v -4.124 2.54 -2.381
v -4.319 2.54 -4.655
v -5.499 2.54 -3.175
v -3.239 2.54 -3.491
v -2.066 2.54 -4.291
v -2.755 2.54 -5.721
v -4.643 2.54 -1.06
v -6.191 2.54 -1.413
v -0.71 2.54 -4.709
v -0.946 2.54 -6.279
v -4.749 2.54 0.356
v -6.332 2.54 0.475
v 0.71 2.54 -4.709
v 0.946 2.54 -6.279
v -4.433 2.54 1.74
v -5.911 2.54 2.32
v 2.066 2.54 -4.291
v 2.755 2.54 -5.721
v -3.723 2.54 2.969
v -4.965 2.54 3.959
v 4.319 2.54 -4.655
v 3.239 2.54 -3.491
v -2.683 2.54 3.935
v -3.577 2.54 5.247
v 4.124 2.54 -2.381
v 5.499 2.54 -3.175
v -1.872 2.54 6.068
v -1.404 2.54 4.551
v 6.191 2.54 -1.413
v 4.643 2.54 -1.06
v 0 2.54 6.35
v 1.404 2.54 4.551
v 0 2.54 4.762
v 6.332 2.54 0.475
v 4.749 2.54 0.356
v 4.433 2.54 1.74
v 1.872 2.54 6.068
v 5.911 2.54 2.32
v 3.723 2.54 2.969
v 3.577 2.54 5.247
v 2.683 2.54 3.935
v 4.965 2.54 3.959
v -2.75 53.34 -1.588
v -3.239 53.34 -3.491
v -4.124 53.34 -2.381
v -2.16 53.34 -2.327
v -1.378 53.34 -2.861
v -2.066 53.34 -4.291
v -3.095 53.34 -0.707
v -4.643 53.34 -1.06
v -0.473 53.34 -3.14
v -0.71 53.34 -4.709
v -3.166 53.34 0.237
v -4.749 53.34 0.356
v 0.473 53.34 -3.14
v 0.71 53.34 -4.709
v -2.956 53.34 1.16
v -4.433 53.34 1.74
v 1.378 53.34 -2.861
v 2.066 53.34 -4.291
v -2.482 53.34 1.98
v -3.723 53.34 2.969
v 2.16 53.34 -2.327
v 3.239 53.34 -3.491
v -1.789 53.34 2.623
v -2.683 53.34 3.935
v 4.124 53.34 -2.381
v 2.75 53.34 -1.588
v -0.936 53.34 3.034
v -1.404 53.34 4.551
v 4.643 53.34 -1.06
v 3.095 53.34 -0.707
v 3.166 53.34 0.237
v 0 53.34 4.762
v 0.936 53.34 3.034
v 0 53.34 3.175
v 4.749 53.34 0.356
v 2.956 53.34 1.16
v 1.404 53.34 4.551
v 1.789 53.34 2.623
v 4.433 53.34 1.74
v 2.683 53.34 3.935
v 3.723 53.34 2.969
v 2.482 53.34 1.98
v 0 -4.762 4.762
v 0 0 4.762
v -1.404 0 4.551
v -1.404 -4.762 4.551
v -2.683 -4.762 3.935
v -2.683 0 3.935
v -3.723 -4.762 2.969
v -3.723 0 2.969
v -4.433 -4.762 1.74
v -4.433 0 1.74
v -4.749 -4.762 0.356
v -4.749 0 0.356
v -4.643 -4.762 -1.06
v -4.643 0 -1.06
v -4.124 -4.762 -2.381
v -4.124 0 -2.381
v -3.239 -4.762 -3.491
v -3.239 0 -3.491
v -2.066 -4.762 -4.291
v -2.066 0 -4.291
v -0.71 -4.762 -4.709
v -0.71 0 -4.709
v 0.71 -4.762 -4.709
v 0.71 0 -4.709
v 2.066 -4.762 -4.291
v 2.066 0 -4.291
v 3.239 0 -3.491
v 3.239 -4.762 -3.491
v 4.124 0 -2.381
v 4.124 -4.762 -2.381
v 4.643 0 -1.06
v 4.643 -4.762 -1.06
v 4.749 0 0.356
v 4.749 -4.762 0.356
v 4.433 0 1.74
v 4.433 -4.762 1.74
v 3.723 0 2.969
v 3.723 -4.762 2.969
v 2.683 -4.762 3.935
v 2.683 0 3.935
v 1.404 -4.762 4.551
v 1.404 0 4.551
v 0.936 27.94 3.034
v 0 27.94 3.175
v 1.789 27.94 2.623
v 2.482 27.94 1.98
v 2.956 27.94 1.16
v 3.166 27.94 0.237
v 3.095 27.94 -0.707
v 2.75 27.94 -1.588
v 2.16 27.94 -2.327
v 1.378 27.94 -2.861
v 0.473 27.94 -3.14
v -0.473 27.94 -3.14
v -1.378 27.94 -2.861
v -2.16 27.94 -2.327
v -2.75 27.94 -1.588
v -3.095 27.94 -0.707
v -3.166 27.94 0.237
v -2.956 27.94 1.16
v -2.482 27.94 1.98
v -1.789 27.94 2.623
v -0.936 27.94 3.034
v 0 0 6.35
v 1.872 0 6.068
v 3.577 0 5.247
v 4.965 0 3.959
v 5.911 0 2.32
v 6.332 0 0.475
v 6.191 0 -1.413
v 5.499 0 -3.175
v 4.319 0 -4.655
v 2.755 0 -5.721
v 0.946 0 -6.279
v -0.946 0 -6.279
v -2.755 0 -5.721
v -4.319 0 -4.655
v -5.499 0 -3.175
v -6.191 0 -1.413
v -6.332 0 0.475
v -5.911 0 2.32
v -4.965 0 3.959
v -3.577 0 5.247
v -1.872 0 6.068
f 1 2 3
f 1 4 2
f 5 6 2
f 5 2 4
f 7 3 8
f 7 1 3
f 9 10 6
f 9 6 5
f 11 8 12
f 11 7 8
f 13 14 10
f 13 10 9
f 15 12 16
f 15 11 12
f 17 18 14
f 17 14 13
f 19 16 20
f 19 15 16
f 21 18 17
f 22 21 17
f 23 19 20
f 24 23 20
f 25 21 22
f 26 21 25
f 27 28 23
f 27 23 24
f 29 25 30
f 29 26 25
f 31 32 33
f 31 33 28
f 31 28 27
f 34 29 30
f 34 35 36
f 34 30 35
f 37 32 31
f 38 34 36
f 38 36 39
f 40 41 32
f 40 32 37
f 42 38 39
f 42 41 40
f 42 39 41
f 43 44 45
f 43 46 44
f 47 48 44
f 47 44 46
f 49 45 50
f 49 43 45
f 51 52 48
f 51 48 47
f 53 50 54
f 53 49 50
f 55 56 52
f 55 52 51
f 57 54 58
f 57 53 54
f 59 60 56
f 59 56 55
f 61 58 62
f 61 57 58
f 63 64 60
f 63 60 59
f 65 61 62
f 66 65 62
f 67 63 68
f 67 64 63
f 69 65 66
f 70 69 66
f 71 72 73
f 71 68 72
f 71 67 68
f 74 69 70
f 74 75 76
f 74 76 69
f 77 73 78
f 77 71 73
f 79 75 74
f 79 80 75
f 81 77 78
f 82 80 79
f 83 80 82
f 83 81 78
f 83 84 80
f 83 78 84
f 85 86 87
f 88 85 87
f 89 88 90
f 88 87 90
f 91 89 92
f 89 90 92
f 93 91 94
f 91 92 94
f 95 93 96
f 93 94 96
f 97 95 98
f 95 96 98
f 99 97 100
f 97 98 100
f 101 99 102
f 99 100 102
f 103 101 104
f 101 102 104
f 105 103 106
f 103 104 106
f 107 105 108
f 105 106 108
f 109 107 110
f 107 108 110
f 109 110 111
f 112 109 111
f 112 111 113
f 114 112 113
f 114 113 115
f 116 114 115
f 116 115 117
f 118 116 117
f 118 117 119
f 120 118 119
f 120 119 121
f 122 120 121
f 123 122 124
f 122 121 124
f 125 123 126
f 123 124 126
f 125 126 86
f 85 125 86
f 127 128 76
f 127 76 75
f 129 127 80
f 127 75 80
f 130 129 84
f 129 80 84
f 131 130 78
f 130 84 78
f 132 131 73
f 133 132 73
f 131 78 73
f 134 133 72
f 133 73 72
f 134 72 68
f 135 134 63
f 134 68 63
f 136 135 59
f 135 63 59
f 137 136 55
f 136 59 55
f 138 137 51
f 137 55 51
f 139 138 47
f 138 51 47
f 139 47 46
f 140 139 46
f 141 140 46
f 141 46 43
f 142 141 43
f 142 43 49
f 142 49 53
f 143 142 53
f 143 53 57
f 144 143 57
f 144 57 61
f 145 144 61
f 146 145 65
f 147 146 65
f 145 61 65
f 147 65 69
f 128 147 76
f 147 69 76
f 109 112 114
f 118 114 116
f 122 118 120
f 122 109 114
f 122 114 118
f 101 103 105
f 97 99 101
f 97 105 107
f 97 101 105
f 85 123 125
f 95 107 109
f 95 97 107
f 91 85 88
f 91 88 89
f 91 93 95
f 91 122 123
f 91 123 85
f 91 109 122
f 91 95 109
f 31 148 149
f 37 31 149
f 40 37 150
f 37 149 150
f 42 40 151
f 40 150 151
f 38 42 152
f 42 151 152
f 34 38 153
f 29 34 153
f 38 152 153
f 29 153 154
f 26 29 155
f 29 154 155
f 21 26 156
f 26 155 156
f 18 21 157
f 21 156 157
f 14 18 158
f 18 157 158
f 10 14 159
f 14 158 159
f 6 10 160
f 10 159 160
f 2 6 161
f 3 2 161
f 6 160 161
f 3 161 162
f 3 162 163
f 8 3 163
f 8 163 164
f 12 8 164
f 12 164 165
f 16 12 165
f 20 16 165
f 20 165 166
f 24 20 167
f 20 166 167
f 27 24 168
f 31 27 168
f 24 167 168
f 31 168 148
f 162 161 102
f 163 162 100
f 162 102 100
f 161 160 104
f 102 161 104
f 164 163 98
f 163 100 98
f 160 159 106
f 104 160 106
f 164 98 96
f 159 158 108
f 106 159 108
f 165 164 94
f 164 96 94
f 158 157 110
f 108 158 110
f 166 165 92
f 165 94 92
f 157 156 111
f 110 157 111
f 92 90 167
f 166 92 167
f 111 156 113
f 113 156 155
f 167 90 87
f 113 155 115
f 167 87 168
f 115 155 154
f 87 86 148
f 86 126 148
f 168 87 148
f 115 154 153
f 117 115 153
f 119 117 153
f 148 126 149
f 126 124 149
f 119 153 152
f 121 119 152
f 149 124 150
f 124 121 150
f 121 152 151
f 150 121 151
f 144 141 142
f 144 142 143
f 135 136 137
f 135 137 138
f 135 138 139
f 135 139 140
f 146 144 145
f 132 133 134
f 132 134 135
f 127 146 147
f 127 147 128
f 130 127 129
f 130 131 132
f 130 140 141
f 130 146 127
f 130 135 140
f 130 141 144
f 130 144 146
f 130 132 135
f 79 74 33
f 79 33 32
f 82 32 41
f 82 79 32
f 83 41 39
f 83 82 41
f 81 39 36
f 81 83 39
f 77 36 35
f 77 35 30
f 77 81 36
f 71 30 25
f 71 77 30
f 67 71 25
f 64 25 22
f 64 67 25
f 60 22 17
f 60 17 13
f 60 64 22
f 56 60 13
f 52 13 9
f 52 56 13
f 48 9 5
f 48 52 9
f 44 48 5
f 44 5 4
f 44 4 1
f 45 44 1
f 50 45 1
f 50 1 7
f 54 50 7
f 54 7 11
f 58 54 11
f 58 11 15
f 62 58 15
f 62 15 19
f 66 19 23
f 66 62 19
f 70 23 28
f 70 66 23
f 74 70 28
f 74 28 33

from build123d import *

# Parameters (mm, degrees)
SKETCH1_R           = 6.35
BOSS_EXTRUDE1_DEPTH = 2.54
SKETCH2_R           = 4.7625
BOSS_EXTRUDE2_DEPTH = 4.7625
BOSS_EXTRUDE3_START = 50.8
SKETCH3_R           = 4.7625
BOSS_EXTRUDE3_DEPTH = 50.8
SKETCH4_R           = 3.175
CUT_EXTRUDE1_DEPTH  = 25.4


with BuildPart() as part:
    # Sketch1 → Boss-Extrude1 (new body)
    with BuildSketch(Plane(origin=(0, 0, 0), x_dir=(1, 0, 0), z_dir=(0, 1, 0))):
        with Locations(Location((0, 0, 0), (0, 0, 270))):
            Circle(SKETCH1_R)
    extrude(amount=BOSS_EXTRUDE1_DEPTH)

    # Sketch2 → Boss-Extrude2 (add)
    with BuildSketch(Plane.XZ):
        with Locations(Location((0, 0, 0), (0, 0, 90))):
            Circle(SKETCH2_R)
    extrude(amount=BOSS_EXTRUDE2_DEPTH)

    # Sketch3 → Boss-Extrude3 (add)
    with BuildSketch(Plane(origin=(0, 2.54, 0), x_dir=(1, 0, 0), z_dir=(0, 1, 0)).offset(BOSS_EXTRUDE3_START)):
        with Locations(Location((0, 0, 0), (0, 0, 270))):
            Circle(SKETCH3_R)
    extrude(amount=-BOSS_EXTRUDE3_DEPTH)

    # Sketch4 → Cut-Extrude1 (cut)
    with BuildSketch(Plane(origin=(0, 53.34, 0), x_dir=(1, 0, 0), z_dir=(0, 1, 0))):
        with Locations(Location((0, 0, 0), (0, 0, 270))):
            Circle(SKETCH4_R)
    extrude(amount=-CUT_EXTRUDE1_DEPTH, mode=Mode.SUBTRACT)


solid = part.part
